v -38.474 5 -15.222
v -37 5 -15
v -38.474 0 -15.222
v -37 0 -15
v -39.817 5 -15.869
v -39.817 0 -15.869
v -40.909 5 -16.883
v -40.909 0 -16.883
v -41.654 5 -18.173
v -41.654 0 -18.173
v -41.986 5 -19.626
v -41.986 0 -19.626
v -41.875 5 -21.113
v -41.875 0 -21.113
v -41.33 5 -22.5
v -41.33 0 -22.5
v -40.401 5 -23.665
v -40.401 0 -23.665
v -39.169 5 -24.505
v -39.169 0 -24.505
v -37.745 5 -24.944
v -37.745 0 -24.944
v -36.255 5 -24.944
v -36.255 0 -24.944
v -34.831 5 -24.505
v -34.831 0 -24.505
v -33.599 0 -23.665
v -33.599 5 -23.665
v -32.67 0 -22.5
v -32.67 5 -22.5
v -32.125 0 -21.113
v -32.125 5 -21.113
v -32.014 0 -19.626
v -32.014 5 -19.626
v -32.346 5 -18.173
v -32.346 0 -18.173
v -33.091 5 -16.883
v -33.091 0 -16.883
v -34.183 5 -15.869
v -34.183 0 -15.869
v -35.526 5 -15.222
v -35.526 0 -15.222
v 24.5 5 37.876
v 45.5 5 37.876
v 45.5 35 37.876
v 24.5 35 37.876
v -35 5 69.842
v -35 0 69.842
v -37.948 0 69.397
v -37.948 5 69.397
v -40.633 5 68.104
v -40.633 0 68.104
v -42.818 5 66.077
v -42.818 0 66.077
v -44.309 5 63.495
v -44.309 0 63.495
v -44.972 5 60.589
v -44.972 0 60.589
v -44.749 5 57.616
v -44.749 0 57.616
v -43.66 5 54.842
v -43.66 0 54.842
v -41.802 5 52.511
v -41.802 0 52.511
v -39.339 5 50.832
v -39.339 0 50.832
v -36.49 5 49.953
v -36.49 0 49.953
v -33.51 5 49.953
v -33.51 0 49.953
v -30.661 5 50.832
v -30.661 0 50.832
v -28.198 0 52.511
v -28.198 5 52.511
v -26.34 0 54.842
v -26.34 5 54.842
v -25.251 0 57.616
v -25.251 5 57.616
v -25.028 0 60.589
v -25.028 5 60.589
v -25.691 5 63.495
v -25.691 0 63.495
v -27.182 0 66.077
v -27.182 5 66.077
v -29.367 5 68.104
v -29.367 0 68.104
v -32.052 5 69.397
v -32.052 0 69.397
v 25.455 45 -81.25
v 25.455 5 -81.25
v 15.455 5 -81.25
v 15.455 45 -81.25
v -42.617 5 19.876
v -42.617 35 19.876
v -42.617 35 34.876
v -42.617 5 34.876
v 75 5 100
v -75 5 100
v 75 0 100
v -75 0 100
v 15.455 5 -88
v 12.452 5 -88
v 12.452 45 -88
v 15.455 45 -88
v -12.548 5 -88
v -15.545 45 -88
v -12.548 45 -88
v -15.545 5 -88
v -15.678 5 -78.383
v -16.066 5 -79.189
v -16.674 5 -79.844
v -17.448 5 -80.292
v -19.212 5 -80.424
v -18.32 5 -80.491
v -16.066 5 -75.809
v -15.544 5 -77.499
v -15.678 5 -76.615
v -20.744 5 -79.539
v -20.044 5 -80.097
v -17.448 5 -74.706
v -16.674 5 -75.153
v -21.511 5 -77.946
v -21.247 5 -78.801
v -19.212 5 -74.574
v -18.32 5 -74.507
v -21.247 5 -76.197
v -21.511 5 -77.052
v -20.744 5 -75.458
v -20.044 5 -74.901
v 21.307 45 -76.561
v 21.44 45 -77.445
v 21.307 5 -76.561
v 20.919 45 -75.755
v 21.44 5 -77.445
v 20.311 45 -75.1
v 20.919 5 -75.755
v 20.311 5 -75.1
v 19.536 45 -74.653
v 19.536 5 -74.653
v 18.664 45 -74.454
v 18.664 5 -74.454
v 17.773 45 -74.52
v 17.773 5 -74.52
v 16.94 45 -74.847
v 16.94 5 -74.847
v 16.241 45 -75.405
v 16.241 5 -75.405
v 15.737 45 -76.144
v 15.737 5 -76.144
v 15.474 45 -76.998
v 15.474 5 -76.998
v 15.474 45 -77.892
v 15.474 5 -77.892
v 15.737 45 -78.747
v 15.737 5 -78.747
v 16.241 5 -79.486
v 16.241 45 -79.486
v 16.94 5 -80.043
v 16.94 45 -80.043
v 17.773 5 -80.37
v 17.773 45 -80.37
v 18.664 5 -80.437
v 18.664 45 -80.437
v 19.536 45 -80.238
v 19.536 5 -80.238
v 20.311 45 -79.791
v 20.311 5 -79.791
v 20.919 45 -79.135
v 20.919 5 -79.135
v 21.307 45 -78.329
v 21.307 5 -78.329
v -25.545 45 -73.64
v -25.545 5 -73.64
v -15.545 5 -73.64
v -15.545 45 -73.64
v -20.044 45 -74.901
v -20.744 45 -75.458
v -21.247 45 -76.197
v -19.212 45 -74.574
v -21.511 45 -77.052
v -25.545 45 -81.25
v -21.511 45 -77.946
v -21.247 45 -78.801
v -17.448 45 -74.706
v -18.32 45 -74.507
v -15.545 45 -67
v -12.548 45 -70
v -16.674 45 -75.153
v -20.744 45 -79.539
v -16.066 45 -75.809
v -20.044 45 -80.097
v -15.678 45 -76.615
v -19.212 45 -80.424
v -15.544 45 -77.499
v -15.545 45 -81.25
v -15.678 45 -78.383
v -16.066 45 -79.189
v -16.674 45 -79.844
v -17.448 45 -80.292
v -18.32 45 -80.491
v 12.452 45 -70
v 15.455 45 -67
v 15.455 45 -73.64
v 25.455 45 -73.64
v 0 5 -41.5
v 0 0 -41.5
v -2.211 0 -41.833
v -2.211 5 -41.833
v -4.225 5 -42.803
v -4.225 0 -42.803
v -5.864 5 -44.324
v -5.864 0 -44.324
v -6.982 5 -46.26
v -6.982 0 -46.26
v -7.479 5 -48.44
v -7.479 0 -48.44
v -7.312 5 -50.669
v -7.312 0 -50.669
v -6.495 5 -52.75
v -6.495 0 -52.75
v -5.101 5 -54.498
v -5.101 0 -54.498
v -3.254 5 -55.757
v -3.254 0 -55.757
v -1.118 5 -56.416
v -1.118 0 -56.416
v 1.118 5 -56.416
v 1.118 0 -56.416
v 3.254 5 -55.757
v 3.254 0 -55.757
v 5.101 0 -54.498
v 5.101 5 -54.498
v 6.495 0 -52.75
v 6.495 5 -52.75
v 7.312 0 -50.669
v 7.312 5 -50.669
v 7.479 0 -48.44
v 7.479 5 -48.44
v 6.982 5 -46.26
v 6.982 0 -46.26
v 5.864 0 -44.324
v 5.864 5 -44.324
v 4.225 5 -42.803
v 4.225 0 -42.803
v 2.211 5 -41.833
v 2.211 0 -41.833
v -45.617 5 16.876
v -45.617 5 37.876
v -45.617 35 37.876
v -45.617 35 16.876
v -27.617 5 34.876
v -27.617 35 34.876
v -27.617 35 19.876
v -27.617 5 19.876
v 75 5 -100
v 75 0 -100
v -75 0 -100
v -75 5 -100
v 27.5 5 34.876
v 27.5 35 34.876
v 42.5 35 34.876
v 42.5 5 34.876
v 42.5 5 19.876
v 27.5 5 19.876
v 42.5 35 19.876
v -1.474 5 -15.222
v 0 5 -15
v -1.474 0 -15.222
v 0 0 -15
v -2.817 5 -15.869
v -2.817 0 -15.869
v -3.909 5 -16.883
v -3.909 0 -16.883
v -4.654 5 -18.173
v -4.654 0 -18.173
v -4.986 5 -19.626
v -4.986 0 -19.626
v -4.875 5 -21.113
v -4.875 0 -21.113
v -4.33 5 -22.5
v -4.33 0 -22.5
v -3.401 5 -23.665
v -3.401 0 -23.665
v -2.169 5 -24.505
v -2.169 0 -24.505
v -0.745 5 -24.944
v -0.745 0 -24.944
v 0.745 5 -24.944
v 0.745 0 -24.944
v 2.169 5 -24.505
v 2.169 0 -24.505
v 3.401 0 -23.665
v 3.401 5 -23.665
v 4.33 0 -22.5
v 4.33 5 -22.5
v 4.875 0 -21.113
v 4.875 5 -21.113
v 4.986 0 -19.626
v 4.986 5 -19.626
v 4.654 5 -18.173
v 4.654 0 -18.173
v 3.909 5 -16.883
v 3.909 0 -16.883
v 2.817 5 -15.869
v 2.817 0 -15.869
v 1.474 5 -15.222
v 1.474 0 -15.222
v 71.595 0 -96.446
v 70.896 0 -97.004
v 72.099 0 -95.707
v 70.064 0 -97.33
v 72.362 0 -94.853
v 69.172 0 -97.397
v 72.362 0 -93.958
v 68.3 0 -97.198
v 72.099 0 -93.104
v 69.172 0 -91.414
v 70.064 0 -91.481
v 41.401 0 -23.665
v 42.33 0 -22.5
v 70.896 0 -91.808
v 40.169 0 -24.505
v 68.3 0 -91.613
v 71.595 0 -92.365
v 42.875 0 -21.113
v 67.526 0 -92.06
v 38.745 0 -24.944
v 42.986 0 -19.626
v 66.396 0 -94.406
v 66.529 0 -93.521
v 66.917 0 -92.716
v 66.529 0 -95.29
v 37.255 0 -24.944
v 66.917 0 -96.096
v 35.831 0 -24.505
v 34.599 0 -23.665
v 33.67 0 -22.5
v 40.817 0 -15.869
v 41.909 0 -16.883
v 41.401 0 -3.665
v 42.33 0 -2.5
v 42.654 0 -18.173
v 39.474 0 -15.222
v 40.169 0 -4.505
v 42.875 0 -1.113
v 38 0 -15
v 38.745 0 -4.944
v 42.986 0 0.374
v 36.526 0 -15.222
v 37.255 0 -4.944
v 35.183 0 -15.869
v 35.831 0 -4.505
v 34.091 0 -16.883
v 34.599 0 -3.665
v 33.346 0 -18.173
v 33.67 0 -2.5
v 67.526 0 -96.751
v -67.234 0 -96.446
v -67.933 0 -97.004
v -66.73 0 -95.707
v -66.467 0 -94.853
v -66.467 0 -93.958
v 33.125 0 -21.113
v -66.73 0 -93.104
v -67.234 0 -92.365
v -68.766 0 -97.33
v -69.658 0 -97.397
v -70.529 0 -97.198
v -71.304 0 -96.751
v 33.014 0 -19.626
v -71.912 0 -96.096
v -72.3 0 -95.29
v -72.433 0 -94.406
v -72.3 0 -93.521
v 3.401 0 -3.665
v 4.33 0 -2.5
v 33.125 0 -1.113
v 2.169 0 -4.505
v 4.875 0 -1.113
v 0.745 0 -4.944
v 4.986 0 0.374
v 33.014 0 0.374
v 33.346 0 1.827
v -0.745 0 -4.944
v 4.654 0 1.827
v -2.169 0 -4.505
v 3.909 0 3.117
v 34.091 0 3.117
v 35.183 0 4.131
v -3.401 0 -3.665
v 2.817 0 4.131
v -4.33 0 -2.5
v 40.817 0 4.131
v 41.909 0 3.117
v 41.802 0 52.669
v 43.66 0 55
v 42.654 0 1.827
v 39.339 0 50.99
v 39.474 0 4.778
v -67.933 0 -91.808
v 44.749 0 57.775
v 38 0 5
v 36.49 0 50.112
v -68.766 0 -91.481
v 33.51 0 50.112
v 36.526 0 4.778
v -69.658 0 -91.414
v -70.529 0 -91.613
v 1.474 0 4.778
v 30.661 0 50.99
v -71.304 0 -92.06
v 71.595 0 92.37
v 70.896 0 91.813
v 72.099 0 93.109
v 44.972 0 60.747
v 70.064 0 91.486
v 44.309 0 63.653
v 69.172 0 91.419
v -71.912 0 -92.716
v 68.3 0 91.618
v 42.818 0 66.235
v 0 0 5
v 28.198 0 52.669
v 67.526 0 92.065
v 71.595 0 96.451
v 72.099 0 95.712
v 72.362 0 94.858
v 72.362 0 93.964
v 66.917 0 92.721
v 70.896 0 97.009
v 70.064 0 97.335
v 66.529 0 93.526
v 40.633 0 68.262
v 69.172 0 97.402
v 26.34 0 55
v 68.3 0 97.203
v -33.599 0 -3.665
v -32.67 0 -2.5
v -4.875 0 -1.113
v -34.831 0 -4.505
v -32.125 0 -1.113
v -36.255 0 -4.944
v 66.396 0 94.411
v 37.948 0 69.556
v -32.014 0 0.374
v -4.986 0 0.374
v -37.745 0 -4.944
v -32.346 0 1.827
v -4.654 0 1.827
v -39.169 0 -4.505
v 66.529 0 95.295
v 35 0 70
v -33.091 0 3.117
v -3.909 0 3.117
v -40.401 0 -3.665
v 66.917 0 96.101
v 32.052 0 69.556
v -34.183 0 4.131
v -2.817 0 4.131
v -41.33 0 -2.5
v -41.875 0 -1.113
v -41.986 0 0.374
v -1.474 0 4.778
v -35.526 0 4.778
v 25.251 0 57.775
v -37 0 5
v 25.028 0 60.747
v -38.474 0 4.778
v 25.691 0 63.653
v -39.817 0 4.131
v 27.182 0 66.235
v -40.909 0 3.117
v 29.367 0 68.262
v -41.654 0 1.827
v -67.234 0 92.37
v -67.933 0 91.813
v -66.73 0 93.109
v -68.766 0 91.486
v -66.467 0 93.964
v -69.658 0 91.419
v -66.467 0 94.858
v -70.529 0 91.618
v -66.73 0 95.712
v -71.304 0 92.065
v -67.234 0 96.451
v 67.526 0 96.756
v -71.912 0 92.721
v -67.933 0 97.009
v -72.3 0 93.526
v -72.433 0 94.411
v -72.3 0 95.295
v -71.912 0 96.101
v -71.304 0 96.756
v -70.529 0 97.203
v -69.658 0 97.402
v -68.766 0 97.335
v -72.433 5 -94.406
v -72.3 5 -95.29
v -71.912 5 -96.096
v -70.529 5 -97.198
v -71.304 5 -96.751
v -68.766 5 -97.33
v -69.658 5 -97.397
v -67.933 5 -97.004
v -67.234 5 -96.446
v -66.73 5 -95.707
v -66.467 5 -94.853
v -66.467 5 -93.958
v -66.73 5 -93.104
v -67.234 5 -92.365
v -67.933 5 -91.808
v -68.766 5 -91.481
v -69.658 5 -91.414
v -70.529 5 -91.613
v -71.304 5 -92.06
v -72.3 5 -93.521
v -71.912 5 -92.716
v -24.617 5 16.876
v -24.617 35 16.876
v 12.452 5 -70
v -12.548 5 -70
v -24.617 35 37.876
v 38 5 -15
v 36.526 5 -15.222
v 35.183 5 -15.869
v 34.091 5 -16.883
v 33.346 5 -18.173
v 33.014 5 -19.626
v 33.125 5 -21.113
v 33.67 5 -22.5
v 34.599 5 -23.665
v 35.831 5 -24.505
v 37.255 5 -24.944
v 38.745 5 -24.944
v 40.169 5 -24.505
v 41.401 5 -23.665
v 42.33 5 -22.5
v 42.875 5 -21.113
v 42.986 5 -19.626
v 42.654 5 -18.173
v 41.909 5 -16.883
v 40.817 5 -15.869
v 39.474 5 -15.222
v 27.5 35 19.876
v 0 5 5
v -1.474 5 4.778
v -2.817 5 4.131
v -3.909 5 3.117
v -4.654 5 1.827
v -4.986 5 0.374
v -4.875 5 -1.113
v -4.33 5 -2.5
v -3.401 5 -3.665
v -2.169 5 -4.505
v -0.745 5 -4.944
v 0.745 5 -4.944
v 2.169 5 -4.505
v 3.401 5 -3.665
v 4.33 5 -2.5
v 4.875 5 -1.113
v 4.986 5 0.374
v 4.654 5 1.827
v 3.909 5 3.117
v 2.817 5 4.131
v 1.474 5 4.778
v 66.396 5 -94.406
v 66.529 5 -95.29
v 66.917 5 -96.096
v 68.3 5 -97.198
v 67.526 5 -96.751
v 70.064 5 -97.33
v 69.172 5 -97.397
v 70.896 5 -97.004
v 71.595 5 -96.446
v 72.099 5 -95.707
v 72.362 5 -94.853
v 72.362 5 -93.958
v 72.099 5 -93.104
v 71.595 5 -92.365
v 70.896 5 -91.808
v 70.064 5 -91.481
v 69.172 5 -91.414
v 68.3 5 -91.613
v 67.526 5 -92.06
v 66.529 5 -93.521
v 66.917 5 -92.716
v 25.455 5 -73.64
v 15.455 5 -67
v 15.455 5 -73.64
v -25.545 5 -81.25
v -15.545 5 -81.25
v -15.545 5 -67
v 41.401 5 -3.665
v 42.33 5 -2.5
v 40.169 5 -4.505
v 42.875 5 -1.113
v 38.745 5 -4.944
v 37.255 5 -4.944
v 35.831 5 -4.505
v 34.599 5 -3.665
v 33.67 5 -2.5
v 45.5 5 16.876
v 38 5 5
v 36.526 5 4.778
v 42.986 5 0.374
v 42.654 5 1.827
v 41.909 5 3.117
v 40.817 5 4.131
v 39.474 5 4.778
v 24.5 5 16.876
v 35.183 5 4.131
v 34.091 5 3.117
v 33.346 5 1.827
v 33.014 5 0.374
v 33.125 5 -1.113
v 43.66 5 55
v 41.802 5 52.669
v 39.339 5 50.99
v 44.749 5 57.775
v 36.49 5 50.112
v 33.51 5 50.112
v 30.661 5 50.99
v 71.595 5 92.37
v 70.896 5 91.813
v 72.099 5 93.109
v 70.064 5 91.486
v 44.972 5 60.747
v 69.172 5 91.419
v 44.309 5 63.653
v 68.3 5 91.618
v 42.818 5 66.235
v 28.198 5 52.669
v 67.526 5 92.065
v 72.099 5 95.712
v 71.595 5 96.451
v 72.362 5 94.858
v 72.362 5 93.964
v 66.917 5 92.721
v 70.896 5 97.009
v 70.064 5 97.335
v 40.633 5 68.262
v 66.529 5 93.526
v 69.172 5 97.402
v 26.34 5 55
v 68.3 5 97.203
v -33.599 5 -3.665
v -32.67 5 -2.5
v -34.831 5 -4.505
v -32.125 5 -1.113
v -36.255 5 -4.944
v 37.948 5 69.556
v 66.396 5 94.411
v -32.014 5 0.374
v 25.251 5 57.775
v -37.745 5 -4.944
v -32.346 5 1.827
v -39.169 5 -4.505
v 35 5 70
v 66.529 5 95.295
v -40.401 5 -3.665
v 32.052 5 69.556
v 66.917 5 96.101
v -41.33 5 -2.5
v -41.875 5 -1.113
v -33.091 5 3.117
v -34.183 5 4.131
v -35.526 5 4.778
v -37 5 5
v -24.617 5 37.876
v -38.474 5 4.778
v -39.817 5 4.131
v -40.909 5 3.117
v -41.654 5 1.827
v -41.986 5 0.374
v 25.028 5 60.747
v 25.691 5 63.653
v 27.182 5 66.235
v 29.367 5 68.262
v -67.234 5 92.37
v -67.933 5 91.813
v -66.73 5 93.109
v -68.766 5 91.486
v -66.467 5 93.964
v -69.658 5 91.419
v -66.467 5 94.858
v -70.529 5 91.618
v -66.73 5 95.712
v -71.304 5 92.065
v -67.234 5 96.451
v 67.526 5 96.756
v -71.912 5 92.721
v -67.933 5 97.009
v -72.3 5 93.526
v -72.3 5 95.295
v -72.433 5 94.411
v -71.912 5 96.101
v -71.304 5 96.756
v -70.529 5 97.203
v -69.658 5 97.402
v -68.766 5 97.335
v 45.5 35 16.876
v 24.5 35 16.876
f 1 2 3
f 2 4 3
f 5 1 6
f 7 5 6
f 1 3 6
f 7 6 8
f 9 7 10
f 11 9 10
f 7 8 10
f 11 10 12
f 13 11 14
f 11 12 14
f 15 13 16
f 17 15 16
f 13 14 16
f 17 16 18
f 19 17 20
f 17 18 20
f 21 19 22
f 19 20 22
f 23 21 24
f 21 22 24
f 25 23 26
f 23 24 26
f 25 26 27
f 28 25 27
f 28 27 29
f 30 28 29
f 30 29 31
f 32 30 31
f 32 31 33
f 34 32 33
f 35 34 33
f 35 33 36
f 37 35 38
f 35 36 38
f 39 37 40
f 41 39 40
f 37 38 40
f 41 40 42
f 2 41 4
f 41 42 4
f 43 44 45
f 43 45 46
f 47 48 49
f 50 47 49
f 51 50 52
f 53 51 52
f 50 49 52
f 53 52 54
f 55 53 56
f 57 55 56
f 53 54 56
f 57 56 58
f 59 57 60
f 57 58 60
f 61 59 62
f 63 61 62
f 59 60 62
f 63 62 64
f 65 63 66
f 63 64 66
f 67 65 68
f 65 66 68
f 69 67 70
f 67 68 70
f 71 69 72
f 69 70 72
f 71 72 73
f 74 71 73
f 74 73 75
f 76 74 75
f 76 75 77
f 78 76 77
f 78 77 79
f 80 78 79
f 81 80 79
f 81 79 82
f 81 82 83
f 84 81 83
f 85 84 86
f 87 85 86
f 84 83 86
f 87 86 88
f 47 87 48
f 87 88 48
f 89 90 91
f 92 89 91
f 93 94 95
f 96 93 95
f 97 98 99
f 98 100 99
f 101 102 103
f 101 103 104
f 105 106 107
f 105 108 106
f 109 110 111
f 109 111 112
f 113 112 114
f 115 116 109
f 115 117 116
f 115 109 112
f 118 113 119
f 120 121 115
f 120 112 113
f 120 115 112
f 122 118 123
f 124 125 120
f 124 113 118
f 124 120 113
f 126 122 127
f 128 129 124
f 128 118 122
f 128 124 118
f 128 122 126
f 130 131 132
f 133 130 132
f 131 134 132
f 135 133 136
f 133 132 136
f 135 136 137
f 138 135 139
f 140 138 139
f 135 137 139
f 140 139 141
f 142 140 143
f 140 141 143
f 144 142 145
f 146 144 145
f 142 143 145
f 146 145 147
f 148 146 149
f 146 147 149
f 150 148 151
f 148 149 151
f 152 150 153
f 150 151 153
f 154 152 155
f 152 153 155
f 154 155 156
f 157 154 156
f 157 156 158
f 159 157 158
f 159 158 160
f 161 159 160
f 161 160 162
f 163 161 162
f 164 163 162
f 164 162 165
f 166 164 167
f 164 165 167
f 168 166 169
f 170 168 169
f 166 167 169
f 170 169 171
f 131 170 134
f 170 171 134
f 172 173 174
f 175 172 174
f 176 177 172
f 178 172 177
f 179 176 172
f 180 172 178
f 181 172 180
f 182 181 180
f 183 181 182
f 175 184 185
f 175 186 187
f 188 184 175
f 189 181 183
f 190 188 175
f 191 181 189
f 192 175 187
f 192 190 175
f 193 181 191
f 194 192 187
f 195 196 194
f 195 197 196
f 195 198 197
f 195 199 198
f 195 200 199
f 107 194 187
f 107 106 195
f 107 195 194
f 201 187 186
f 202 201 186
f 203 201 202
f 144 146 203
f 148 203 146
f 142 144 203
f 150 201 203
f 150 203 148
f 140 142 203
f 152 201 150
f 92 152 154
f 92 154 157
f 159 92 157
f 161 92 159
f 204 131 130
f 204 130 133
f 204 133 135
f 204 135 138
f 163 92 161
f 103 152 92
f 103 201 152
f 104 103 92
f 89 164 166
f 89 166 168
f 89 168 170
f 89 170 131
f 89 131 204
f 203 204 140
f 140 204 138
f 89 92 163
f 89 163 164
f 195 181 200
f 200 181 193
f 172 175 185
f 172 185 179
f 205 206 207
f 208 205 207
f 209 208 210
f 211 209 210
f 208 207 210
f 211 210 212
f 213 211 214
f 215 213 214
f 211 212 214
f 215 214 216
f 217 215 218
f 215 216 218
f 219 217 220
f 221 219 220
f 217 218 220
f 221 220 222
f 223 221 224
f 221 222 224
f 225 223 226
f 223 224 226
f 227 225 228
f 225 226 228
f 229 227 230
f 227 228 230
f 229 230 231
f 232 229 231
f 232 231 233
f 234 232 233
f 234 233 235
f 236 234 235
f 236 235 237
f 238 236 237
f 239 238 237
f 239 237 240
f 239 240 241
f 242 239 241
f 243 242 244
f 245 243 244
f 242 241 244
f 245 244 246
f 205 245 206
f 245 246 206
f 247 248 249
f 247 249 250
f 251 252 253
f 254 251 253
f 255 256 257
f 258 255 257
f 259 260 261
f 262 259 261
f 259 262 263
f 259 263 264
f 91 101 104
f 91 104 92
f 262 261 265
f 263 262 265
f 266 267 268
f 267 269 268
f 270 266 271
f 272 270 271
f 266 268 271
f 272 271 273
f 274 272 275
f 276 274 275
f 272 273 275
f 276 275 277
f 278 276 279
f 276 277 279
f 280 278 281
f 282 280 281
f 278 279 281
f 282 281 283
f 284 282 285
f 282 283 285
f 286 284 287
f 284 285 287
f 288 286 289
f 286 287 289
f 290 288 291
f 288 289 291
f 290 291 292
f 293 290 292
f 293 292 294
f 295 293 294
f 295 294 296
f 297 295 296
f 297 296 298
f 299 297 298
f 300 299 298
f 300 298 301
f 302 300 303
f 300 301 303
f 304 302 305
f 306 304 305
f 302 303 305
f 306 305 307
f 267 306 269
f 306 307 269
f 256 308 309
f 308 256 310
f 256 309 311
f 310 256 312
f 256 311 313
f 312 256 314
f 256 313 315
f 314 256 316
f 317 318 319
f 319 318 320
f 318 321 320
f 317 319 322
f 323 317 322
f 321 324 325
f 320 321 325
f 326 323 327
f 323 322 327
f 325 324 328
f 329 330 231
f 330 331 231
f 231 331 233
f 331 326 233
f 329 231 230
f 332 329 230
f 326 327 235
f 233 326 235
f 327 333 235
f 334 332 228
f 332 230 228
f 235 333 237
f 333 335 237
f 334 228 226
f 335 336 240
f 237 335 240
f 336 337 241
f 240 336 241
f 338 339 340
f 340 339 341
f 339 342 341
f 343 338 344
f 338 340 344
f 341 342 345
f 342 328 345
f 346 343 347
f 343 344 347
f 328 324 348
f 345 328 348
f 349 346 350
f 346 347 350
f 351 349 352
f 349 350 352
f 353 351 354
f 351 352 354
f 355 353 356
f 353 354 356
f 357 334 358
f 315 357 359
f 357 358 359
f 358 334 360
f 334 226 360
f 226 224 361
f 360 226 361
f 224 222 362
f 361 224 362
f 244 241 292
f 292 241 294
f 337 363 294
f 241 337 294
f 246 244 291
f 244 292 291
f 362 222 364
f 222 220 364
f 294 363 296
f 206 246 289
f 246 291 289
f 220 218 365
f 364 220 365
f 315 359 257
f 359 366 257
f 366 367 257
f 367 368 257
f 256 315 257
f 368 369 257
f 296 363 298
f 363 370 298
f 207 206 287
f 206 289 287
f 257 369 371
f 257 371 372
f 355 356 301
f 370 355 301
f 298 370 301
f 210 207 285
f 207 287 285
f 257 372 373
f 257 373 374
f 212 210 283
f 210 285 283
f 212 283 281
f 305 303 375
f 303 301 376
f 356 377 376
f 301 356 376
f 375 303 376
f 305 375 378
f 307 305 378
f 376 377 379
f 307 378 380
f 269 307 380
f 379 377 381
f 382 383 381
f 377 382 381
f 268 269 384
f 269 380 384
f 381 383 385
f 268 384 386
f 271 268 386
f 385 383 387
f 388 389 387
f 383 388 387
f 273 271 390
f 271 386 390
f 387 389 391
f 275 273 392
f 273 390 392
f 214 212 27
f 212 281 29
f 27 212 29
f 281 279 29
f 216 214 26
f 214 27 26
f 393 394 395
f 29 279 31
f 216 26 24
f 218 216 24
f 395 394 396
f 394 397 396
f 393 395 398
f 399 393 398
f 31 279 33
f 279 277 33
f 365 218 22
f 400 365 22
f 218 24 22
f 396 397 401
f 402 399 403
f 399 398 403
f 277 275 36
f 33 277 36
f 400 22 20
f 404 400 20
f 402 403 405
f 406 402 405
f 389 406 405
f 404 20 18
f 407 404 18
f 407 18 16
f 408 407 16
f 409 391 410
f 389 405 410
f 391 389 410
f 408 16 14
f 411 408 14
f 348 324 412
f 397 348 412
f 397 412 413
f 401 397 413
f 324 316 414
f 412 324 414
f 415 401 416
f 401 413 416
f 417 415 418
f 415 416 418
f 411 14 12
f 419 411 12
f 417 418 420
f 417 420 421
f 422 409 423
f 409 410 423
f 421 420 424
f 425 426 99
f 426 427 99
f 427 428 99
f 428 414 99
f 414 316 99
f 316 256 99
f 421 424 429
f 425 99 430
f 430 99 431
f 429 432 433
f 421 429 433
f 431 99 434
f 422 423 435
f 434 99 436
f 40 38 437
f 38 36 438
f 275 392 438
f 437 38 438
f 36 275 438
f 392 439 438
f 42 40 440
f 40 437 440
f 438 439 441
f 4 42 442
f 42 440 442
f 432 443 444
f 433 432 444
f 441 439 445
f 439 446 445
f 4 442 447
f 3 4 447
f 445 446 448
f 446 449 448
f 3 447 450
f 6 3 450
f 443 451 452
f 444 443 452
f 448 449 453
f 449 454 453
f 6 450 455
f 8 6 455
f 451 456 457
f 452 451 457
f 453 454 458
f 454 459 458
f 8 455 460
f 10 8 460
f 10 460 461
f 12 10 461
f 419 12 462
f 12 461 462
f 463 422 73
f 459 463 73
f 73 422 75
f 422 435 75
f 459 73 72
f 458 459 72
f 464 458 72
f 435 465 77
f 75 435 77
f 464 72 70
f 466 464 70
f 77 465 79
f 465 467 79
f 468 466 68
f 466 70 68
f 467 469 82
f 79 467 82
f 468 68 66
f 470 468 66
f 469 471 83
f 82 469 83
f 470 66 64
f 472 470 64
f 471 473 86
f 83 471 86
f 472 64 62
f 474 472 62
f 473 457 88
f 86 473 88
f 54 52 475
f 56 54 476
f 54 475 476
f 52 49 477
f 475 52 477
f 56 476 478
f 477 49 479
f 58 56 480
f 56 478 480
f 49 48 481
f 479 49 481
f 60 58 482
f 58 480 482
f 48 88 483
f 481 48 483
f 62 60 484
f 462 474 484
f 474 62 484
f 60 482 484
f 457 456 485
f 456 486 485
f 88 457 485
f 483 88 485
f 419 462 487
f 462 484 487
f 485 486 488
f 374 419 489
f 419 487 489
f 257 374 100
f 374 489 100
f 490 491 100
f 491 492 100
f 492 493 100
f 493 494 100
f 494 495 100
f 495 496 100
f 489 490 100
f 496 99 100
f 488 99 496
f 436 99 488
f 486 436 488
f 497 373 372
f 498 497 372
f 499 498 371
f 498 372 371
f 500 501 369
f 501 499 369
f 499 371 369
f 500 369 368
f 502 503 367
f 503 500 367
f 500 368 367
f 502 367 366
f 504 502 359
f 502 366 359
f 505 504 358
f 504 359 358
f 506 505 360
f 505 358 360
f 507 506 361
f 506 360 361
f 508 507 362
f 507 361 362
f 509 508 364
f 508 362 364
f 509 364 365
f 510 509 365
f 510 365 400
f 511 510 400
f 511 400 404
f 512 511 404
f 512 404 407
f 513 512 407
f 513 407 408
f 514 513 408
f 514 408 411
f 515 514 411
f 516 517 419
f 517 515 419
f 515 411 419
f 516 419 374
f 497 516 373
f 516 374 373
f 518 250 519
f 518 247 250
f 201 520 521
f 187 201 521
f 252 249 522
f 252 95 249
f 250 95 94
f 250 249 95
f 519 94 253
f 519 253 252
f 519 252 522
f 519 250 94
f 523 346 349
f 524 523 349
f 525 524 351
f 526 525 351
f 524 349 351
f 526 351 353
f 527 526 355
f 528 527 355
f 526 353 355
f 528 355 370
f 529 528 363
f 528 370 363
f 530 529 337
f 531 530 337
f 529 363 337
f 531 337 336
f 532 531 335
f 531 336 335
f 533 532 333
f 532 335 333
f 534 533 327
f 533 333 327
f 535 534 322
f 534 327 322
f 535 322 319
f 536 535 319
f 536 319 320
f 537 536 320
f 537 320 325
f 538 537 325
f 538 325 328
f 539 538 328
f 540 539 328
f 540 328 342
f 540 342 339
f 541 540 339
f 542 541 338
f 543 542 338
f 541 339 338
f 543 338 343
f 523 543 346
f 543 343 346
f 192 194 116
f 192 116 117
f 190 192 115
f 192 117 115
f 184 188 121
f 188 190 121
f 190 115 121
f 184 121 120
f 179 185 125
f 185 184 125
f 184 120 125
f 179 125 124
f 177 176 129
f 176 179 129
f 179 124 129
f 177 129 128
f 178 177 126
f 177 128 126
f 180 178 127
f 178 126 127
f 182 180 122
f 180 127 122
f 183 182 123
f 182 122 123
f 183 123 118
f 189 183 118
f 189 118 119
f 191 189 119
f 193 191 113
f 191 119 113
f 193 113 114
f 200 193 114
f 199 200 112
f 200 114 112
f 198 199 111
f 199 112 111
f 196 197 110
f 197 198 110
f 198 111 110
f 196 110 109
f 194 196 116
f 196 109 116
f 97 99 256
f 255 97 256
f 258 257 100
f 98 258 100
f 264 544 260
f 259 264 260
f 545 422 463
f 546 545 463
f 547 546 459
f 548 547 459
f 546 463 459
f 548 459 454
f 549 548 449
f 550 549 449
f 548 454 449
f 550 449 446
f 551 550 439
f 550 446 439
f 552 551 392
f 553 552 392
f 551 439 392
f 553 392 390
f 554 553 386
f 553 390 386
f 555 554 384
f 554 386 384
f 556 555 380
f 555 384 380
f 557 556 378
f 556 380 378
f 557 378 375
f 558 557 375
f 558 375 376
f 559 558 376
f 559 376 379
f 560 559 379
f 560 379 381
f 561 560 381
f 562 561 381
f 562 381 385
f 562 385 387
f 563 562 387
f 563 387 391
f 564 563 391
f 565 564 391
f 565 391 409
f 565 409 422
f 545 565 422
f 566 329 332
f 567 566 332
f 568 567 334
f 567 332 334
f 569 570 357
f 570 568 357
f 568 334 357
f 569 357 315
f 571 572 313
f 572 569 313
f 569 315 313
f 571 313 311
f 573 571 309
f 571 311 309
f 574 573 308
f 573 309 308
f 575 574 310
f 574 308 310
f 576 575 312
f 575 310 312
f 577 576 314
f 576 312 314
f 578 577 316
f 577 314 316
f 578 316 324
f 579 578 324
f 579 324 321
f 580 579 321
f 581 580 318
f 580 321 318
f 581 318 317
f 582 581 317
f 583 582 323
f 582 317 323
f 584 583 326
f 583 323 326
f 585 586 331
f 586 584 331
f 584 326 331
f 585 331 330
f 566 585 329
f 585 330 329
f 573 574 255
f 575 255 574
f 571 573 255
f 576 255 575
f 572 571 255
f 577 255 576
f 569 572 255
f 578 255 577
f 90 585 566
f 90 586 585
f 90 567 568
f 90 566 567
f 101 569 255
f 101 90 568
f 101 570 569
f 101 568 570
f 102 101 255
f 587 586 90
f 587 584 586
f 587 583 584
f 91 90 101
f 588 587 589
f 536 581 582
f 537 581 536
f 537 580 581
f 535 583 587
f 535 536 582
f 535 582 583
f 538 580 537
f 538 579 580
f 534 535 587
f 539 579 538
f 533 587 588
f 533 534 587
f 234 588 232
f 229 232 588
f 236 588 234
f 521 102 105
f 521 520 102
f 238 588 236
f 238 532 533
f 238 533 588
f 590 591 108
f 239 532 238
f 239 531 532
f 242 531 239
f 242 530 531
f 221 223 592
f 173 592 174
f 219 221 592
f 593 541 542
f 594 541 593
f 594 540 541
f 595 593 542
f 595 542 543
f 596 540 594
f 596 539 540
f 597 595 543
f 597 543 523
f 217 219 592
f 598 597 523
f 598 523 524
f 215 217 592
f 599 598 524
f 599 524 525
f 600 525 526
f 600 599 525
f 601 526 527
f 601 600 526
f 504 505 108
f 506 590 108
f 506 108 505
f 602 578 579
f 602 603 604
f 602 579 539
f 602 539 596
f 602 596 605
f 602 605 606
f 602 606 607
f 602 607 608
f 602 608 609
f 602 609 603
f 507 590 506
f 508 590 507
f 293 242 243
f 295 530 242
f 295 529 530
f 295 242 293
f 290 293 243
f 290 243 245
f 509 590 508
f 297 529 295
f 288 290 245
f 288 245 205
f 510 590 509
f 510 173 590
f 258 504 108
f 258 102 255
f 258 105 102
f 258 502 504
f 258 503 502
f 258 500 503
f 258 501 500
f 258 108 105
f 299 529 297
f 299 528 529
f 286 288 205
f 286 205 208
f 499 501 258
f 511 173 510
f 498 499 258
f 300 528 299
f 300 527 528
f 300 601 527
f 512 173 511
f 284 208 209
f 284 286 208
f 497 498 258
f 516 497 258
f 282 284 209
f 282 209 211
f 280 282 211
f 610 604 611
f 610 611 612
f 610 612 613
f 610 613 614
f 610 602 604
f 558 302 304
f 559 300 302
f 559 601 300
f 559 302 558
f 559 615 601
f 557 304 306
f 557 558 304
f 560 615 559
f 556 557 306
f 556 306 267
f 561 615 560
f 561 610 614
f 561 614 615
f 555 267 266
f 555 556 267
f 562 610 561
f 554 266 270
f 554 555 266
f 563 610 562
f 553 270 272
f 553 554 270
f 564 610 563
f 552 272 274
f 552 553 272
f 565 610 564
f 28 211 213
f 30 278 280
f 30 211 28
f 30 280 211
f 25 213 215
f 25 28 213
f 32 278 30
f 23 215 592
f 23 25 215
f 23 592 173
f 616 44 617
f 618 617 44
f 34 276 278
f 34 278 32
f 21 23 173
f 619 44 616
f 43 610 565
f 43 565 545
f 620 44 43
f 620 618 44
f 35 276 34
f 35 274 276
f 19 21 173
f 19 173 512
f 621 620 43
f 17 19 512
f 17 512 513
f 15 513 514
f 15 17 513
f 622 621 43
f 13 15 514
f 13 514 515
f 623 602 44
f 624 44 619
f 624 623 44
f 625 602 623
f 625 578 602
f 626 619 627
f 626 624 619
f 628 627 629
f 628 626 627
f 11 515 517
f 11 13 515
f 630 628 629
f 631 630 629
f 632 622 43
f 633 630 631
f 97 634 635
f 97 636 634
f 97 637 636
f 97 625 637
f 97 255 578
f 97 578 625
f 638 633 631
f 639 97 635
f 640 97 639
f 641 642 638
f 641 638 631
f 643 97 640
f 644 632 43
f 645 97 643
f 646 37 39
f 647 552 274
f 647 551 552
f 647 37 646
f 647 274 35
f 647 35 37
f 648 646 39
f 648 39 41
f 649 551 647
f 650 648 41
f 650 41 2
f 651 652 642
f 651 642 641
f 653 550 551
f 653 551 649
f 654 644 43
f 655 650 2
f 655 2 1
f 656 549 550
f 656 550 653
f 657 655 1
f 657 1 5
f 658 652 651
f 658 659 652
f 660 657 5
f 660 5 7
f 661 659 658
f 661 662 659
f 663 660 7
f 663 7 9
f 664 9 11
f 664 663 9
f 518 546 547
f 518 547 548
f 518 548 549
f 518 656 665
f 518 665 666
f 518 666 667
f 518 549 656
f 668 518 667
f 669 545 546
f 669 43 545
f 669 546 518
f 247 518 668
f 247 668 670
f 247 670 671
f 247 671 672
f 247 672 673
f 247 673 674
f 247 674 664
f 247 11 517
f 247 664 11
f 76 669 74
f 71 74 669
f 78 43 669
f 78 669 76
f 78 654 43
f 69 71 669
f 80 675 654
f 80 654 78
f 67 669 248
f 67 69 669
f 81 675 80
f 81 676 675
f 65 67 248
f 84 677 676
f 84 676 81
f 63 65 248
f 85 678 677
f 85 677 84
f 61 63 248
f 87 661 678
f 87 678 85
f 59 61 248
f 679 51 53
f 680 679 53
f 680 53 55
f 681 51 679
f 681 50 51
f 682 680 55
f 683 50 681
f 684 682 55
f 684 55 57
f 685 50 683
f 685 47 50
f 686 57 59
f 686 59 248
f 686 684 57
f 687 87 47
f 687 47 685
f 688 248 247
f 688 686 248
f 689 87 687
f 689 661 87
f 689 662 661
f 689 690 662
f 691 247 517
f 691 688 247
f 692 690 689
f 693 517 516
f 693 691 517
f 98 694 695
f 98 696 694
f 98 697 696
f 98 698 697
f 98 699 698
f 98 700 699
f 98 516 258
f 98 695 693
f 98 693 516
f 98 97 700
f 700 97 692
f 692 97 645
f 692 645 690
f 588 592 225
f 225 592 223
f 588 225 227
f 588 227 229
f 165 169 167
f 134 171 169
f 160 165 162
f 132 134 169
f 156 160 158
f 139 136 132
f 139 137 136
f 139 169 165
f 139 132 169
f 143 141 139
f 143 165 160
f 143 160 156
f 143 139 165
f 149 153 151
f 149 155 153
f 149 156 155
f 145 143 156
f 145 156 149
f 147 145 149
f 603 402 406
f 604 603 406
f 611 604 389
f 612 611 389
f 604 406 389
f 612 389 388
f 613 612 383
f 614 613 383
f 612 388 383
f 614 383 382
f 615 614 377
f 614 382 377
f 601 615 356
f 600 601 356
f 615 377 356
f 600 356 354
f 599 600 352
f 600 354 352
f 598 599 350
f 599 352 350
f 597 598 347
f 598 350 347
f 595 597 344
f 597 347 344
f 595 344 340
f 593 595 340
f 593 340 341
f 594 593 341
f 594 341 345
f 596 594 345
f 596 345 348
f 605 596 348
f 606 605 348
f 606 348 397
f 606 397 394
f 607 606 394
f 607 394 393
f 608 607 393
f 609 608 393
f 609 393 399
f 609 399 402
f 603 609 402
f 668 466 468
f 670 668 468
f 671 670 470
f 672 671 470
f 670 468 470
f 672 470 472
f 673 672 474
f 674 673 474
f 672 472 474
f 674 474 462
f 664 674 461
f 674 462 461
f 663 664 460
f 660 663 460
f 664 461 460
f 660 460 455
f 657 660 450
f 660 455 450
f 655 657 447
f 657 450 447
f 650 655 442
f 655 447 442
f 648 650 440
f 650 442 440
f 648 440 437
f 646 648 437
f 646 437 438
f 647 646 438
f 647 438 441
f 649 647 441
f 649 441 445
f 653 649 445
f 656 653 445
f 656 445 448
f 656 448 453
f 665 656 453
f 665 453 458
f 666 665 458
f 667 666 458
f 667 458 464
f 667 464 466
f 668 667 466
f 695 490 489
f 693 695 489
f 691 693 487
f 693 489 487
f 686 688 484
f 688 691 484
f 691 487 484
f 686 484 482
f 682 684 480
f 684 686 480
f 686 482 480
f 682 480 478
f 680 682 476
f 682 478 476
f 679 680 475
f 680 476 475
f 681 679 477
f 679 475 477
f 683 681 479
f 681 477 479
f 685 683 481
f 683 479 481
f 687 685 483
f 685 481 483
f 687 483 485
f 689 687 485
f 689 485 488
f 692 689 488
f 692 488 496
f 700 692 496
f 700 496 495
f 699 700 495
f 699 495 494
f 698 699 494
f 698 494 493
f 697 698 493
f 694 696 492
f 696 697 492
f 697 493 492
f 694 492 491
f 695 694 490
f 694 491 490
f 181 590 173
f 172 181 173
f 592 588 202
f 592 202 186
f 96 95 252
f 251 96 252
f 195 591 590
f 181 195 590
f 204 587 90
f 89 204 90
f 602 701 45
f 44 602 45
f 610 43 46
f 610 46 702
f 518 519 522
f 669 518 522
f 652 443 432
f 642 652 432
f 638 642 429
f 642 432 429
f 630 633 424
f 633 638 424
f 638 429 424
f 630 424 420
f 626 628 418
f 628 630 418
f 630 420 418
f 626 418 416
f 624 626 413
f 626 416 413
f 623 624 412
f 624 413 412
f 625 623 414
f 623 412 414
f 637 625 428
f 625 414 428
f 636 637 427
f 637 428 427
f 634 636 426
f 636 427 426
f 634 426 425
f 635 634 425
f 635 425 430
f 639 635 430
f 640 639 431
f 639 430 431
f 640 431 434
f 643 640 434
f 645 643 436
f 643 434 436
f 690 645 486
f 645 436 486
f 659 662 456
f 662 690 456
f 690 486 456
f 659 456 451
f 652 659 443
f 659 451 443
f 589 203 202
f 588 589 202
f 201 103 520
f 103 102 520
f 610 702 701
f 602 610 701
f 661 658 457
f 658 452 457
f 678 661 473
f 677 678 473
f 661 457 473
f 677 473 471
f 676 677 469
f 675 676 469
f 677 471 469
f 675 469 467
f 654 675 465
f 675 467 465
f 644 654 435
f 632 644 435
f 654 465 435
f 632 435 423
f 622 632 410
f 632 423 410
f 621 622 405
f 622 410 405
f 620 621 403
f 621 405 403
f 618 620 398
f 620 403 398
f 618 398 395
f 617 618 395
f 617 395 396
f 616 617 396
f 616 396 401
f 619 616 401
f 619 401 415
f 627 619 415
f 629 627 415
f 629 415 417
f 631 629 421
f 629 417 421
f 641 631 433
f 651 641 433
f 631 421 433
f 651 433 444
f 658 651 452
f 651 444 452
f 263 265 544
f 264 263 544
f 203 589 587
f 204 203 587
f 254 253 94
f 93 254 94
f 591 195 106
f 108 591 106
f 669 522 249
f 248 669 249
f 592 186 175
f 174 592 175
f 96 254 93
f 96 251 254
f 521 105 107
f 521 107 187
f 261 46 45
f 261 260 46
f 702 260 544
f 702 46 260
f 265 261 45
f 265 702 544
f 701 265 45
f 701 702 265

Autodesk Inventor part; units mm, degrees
ref_plane "YZ Plane" through (0, 0, 0) normal (1, 0, 0) x (0, 1, 0)
ref_plane "XZ Plane" through (0, 0, 0) normal (0, 1, 0) x (-1, 0, 0)
ref_plane "XY Plane" through (0, 0, 0) normal (0, 0, 1) x (1, 0, 0)
sketch "Sketch1" plane through (0, 0, 0) normal (0, 1, 0) x (-1, 0, 0)
  line L0 (-75, 0) -> (-75, -100)
  line L1 (-75, -100) -> (75, -100)
  line L2 (75, -100) -> (75, 100)
  line L3 (75, 100) -> (-75, 100)
  line L4 (-75, 100) -> (-75, 0)
  circle A0 centre (69.4334, -94.4056) radius 3
  circle A1 centre (-69.396, -94.4056) radius 3
  circle A2 centre (-69.396, 94.4107) radius 3
  circle A3 centre (69.4334, 94.4107) radius 3
  point P0 (0, 0)
  dimension "d3" = 150
  dimension "d4" = 200
  dimension "d5" = 6
  dimension "d8" = 6
  dimension "d10" = 6
  dimension "d12" = 6
extrude "Extrusion1" add sketch "Sketch1" along normal blind 5
sketch "Sketch2" plane through (0, 5, 0) normal (0, 1, 0) x (1, 0, 0)
  circle A0 centre (-34.9985, -59.8752) radius 10
  circle A1 centre (35, -59.8759) radius 10
  line L0 (-35.1169, -34.8759) -> (-27.6169, -34.8759)
  line L1 (-27.6169, -34.8759) -> (-27.6169, -19.8759)
  line L2 (-27.6169, -19.8759) -> (-42.6169, -19.8759)
  line L3 (-42.6169, -19.8759) -> (-42.6169, -34.8759)
  line L4 (-42.6169, -34.8759) -> (-35.1169, -34.8759)
  line L5 (-27.6169, -37.8759) -> (-45.6169, -37.8759)
  line L6 (-45.6169, -37.8759) -> (-45.6169, -16.8759)
  line L7 (-45.6169, -16.8759) -> (-24.6169, -16.8759)
  line L8 (-24.6169, -16.8759) -> (-24.6169, -37.8759)
  line L9 (-24.6169, -37.8759) -> (-27.6169, -37.8759)
  line L10 (35, -34.8759) -> (42.5, -34.8759)
  line L11 (42.5, -34.8759) -> (42.5, -19.8759)
  line L12 (42.5, -19.8759) -> (27.5, -19.8759)
  line L13 (27.5, -19.8759) -> (27.5, -34.8759)
  line L14 (27.5, -34.8759) -> (35, -34.8759)
  line L15 (42.5, -37.8759) -> (24.5, -37.8759)
  line L16 (24.5, -37.8759) -> (24.5, -16.8759)
  line L17 (24.5, -16.8759) -> (45.5, -16.8759)
  line L18 (45.5, -16.8759) -> (45.5, -37.8759)
  line L19 (45.5, -37.8759) -> (42.5, -37.8759)
  line L20 (0, 85) -> (12.4518, 85)
  line L21 (12.4518, 85) -> (12.4518, 70)
  line L22 (12.4518, 70) -> (-12.5482, 70)
  line L23 (-12.5482, 70) -> (-12.5482, 85)
  line L24 (-12.5482, 85) -> (-0.0482, 85)
  line L25 (-12.5482, 85) -> (-12.5482, 77.5)
  circle A2 centre (-0.0482, 20) radius 6.5
  circle A3 centre (38, 20) radius 6.5
  line L26 (-75, 20) -> (-45, 20)
  circle A4 centre (-38.8669, 20) radius 6.5
  line L27 (12.4518, 67) -> (-15.5449, 67)
  line L28 (-15.5449, 67) -> (-15.5449, 88)
  line L29 (-15.5449, 88) -> (15.4551, 88)
  line L30 (15.4551, 88) -> (15.4551, 67)
  line L31 (15.4551, 67) -> (12.4518, 67)
  circle A5 centre (-18.5444, 77.4989) radius 3
  line L32 (-15.5449, 81.25) -> (-25.5449, 81.25)
  line L33 (-25.5449, 81.25) -> (-25.5449, 73.6405)
  line L34 (-25.5449, 73.6405) -> (-15.5449, 73.6405)
  circle A6 centre (18.4402, 77.4452) radius 3
  line L35 (15.4551, 73.6402) -> (25.4551, 73.6402)
  line L36 (25.4551, 73.6402) -> (25.4551, 81.25)
  line L37 (25.4551, 81.25) -> (15.4551, 81.25)
  line L38 (-12.5482, 85) -> (-15.5449, 85)
  line L39 (12.4518, 85) -> (15.4551, 85)
  line L40 (-12.5482, 85) -> (-12.5482, 88)
  line L41 (-12.5482, 70) -> (-12.5482, 67)
  line L42 (12.4518, 85) -> (12.4518, 88)
  line L43 (12.4518, 70) -> (12.4518, 67)
  line L44 (12.4518, 70) -> (15.4551, 70)
  line L45 (-12.5482, 70) -> (-15.5449, 70)
  point P0 (0, 0)
  point P1 (15.4551, 77.1464)
  point P2 (15.4551, 77.7441)
  point P3 (-15.5449, 77.5524)
  point P4 (-15.5449, 77.4455)
  dimension "d18" = 20
  dimension "d22" = 20
  dimension "d31" = 15
  dimension "d32" = 15
  dimension "d35" = 21
  dimension "d36" = 21
  dimension "d39" = 15
  dimension "d40" = 15
  dimension "d42" = 21
  dimension "d45" = 15
  dimension "d46" = 25
  dimension "d53" = 13
  dimension "d54" = 13
  dimension "d56" = 30
  dimension "d57" = 13
  dimension "d60" = 21
  dimension "d61" = 31
  dimension "d62" = 6
  dimension "d64" = 10
  dimension "d67" = 6
  dimension "d69" = 10
extrude "Extrusion2" add sketch "Sketch2" along normal blind 40 contours L42 L29 L30 L39
extrude "Extrusion3" add sketch "Sketch2" along normal blind 40 contours L39 L30 A6 L44 L21
extrude "Extrusion4" add sketch "Sketch2" along normal blind 40 contours L40 L38 L28 L29
extrude "Extrusion5" add sketch "Sketch2" along normal blind 40 contours L45 L28 L38 L23
extrude "Extrusion6" add sketch "Sketch2" along normal blind 40 contours L41 L27 L28 L45
extrude "Extrusion7" add sketch "Sketch2" along normal blind 40 contours L43 L27 L41 L22
extrude "Extrusion8" add sketch "Sketch2" along normal blind 40 contours L44 L30 L31 L43
extrude "Extrusion9" add sketch "Sketch2" along normal blind 40 contours L37 L36 L35 L30 A6
extrude "Extrusion10" add sketch "Sketch2" along normal blind 40 contours L34 L33 L32 L28
extrude "Extrusion11" add sketch "Sketch2" along normal blind 30 contours L5 L6 L7 L8 L9
extrude "Extrusion12" add sketch "Sketch2" along normal blind 30 contours L15 L16 L17 L18 L19
sketch "Sketch3" plane through (0, 5, 0) normal (0, 1, 0) x (1, 0, 0)
  circle A0 centre (-35, -59.8417) radius 10
  circle A1 centre (35, -60) radius 10
  circle A2 centre (0, 20) radius 5
  circle A3 centre (38, 20) radius 5
  circle A4 centre (-37, 20) radius 5
  circle A5 centre (0, 0) radius 5
  circle A6 centre (38, 0) radius 5
  circle A7 centre (-37, 0) radius 5
  dimension "d94" = 20
  dimension "d95" = 20
  dimension "d101" = 10
  dimension "d103" = 10
  dimension "d104" = 10
  dimension "d106" = 10
  dimension "d107" = 10
  dimension "d108" = 10
hole "Hole1" at (-35, 5, 59.8417) direction (0, -1, 0) diameter 20 end through all
hole "Hole2" at (35, 5, 60) direction (0, -1, 0) diameter 20 end through all
hole "Hole3" at (-37, 5, 0) direction (0, -1, 0) diameter 10 end through all
hole "Hole4" at (-37, 5, -20) direction (0, -1, 0) diameter 10 end through all
hole "Hole5" at (0, 5, -20) direction (0, -1, 0) diameter 10 end through all
hole "Hole6" at (0, 5, 0) direction (0, -1, 0) diameter 10 end through all
hole "Hole7" at (38, 5, -20) direction (0, -1, 0) diameter 10 end through all
hole "Hole8" at (38, 5, 0) direction (0, -1, 0) diameter 10 end through all
sketch "Sketch4" plane through (0, 5, 0) normal (0, 1, 0) x (1, 0, 0)
  circle A0 centre (0, 49) radius 7.5
  point P0 (0, 0)
  dimension "d166" = 15
hole "Hole9" at (0, 5, -49) direction (0, -1, 0) diameter 15 end through all
properties part number "Lock"
